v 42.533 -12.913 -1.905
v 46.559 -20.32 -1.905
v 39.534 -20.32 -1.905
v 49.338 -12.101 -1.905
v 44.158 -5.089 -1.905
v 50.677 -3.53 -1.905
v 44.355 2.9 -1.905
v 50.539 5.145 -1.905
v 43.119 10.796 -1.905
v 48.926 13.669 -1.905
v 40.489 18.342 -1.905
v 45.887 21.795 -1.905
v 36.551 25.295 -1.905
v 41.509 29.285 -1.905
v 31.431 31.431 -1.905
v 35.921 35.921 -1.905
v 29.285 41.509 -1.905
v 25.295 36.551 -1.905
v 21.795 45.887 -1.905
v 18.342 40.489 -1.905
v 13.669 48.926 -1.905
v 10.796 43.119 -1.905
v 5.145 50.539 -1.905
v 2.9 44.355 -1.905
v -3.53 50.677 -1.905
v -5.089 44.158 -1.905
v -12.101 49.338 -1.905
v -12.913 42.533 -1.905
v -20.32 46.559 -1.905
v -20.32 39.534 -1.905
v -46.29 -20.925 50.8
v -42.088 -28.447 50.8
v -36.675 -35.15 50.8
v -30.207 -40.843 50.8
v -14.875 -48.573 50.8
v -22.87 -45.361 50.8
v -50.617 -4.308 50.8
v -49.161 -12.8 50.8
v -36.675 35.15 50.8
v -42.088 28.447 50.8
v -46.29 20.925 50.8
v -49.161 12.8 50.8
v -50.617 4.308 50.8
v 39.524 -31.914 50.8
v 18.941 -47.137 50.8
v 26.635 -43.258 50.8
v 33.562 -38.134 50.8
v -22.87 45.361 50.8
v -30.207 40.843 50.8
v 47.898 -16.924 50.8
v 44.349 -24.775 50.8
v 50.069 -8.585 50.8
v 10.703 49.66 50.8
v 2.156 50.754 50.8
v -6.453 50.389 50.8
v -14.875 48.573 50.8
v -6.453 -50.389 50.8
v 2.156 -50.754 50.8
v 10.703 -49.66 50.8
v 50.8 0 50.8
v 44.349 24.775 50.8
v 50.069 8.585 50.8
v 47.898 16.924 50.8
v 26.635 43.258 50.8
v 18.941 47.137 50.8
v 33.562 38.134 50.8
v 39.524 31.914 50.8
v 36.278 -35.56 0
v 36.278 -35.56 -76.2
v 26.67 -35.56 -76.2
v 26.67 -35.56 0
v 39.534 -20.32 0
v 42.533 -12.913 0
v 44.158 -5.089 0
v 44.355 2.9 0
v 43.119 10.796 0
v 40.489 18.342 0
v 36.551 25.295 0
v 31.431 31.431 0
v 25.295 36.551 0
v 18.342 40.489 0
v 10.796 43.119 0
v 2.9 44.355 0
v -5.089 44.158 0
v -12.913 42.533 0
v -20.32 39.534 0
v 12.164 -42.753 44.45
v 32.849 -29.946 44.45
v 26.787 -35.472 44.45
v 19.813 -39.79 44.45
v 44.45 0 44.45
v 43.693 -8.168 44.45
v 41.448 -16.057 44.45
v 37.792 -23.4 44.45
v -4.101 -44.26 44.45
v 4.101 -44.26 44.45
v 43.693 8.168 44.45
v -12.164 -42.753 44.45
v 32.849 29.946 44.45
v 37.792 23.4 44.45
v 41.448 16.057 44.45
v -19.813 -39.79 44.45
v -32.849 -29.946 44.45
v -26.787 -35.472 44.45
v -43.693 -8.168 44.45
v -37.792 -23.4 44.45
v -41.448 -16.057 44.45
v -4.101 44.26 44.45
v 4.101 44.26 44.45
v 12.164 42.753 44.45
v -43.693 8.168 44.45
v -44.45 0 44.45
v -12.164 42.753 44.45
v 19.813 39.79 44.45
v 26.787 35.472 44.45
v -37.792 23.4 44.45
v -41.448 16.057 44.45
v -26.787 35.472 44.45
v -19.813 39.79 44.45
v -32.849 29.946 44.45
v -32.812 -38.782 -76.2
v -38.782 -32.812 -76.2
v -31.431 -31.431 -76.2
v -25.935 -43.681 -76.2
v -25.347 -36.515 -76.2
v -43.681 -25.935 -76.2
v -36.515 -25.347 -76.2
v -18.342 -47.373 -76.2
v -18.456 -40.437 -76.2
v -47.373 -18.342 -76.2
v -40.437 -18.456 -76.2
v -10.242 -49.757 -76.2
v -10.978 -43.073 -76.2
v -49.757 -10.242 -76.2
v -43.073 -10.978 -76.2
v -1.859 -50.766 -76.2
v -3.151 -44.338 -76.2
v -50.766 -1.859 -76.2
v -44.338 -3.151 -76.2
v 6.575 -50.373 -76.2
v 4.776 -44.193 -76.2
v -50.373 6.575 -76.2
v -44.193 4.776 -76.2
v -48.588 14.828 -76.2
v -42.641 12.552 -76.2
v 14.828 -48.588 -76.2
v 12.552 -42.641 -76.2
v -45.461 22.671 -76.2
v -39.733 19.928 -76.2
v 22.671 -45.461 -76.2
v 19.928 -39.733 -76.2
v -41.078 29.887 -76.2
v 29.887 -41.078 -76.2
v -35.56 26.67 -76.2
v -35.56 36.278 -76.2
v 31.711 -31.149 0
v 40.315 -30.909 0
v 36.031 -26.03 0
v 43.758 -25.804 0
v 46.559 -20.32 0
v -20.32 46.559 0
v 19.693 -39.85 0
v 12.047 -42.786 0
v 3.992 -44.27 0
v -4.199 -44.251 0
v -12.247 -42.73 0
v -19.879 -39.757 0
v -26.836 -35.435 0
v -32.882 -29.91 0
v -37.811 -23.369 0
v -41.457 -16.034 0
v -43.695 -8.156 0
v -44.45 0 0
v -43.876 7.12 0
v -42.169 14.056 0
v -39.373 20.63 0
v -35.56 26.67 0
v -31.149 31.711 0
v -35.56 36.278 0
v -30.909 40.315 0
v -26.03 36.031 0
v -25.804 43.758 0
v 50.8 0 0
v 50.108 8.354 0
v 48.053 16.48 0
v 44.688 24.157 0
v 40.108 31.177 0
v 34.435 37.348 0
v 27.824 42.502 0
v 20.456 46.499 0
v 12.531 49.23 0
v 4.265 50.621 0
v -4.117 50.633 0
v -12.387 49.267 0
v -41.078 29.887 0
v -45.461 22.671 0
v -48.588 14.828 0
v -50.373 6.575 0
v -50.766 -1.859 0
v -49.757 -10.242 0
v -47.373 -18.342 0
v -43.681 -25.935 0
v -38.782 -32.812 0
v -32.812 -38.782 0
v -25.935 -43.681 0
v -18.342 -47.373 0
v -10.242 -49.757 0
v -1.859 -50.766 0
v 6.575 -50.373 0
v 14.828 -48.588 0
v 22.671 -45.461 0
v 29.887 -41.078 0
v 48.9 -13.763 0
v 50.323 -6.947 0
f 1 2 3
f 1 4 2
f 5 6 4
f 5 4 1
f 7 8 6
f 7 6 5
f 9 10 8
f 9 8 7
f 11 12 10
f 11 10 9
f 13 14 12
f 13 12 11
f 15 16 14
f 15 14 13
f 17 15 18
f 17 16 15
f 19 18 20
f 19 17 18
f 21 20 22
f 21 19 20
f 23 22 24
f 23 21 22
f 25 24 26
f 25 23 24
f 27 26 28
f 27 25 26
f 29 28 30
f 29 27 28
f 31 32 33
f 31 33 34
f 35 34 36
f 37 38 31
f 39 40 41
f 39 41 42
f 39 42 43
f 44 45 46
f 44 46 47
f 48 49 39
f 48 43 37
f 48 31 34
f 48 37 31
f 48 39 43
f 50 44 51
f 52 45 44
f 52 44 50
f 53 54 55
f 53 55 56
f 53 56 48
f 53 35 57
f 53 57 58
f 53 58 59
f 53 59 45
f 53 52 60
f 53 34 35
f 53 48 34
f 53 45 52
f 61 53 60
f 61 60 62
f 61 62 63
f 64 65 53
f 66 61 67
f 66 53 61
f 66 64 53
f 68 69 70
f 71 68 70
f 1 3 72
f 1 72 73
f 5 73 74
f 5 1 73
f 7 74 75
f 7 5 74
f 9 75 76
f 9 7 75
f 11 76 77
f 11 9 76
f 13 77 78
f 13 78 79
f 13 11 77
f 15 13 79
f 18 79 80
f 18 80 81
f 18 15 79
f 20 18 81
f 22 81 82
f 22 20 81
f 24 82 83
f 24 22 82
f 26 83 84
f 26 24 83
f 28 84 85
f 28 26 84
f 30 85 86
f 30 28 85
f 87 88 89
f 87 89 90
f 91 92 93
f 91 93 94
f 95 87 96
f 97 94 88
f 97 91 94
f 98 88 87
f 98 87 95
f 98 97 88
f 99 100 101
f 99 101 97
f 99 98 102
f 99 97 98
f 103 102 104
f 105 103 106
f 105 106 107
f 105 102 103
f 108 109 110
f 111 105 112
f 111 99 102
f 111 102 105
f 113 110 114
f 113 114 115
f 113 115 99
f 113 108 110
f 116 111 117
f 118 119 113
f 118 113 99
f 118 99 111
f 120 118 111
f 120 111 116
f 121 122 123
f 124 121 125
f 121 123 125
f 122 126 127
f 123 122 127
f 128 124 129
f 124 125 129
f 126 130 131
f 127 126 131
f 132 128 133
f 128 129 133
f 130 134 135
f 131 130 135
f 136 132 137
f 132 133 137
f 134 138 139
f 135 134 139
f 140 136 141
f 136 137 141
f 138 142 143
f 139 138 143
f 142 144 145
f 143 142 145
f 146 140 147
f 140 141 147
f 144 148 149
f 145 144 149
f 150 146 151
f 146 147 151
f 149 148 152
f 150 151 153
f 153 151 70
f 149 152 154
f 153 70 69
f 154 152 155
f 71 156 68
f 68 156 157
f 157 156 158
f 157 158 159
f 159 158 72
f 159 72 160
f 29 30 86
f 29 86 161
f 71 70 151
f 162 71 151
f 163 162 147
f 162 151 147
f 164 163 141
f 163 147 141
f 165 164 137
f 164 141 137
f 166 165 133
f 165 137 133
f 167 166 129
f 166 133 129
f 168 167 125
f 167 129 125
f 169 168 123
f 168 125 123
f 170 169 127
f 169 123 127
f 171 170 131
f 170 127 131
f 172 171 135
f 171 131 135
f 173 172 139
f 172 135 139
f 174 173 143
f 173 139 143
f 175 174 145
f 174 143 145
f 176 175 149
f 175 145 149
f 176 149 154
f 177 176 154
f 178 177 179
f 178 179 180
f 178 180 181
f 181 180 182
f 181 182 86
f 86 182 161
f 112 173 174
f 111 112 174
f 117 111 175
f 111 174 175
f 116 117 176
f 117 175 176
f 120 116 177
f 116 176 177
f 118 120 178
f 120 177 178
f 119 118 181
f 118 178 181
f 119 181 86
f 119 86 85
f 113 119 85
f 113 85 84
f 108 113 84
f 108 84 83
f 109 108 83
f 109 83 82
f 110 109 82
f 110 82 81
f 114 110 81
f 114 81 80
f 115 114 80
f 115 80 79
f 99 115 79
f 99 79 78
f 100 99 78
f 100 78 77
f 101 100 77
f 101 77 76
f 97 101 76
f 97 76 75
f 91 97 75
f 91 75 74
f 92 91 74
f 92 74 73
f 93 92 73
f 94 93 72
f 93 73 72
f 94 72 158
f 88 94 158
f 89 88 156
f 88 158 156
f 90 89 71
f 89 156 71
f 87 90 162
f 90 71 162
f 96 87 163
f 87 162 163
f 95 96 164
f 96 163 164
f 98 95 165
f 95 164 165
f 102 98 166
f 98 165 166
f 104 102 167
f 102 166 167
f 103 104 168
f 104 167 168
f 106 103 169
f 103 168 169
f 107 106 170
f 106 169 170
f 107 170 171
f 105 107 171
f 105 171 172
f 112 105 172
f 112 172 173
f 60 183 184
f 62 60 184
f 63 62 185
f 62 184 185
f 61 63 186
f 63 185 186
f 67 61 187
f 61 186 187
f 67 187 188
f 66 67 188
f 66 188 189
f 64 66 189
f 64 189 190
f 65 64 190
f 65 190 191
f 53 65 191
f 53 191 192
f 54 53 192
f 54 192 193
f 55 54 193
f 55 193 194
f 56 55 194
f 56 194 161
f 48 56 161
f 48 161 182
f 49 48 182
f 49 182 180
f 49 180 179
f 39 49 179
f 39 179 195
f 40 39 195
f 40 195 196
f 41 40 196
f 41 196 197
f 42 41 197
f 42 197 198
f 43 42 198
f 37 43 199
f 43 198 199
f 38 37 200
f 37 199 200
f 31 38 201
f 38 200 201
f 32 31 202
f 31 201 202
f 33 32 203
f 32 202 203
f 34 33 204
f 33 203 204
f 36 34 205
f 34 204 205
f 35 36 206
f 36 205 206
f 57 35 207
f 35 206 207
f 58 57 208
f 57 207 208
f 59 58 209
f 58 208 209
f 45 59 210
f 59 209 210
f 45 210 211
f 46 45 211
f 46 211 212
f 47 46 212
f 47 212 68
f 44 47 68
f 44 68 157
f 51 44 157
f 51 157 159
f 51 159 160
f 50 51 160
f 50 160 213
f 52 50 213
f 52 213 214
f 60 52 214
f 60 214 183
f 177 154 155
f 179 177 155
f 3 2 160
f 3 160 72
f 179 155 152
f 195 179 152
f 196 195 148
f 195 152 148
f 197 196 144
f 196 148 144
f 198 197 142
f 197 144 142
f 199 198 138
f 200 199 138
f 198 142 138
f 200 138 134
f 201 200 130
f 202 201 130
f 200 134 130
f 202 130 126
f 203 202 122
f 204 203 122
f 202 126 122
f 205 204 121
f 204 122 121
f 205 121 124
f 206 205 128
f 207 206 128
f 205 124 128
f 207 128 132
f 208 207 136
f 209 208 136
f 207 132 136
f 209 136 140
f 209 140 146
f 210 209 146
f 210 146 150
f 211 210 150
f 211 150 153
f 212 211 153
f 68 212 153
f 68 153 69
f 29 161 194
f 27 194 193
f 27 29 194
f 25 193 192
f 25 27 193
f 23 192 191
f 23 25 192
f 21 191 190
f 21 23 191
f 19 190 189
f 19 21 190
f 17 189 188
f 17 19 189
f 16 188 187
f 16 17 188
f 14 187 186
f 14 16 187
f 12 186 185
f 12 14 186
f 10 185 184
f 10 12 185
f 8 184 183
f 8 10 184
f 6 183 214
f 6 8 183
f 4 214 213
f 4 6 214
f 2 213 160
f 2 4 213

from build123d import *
from build123d.topology import SkipClean

# Parameters (mm, degrees)
SKETCH1_R           = 50.8
BOSS_EXTRUDE1_DEPTH = 50.8
SKETCH2_R           = 44.45
CUT_EXTRUDE1_DEPTH  = 44.45
BOSS_EXTRUDE2_START = 76.2
BOSS_EXTRUDE2_DEPTH = 76.2
BOSS_EXTRUDE3_START = 1.905
BOSS_EXTRUDE3_DEPTH = 1.905


with BuildPart() as part:
    # Sketch1 → Boss-Extrude1 (new body)
    with BuildSketch(Plane.XY):
        Circle(SKETCH1_R)
    extrude(amount=BOSS_EXTRUDE1_DEPTH)

    # Sketch2 → Cut-Extrude1 (cut)
    with BuildSketch(Plane(origin=(0, 0, 0), x_dir=(-1, 0, 0), z_dir=(0, 0, -1))):
        Circle(SKETCH2_R)
    extrude(amount=-CUT_EXTRUDE1_DEPTH, mode=Mode.SUBTRACT)

    # Sketch3 → Boss-Extrude2 (add)
    with BuildSketch(Plane(origin=(0, 0, 0), x_dir=(-1, 0, 0), z_dir=(0, 0, -1)).offset(BOSS_EXTRUDE2_START)):
        with BuildLine():
            Line((-36.278456417, -35.56), (-26.67, -35.56))
            ThreePointArc((-26.67, -35.56), (31.430896424, -31.430896424), (35.56, 26.67))
            Line((35.56, 26.67), (35.56, 36.278456417))
            ThreePointArc((35.56, 36.278456417), (35.921024484, -35.921024484), (-36.278456417, -35.56))
        make_face()
    extrude(amount=-BOSS_EXTRUDE2_DEPTH)

    # Sketch4 → Boss-Extrude3 (add)
    with SkipClean():  # the faces are left unmerged after this step: merging them gives an invalid solid
        with BuildSketch(Plane(origin=(0, 0, 0), x_dir=(-1, 0, 0), z_dir=(0, 0, -1)).offset(BOSS_EXTRUDE3_START)):
            with BuildLine():
                Line((-46.558969061, -20.32), (-39.533531337, -20.32))
                ThreePointArc((-39.533531337, -20.32), (-31.430896424, 31.430896424), (20.32, 39.533531337))
                Line((20.32, 39.533531337), (20.32, 46.558969061))
                ThreePointArc((20.32, 46.558969061), (-35.921024484, 35.921024484), (-46.558969061, -20.32))
            make_face()
        extrude(amount=-BOSS_EXTRUDE3_DEPTH)


solid = part.part
